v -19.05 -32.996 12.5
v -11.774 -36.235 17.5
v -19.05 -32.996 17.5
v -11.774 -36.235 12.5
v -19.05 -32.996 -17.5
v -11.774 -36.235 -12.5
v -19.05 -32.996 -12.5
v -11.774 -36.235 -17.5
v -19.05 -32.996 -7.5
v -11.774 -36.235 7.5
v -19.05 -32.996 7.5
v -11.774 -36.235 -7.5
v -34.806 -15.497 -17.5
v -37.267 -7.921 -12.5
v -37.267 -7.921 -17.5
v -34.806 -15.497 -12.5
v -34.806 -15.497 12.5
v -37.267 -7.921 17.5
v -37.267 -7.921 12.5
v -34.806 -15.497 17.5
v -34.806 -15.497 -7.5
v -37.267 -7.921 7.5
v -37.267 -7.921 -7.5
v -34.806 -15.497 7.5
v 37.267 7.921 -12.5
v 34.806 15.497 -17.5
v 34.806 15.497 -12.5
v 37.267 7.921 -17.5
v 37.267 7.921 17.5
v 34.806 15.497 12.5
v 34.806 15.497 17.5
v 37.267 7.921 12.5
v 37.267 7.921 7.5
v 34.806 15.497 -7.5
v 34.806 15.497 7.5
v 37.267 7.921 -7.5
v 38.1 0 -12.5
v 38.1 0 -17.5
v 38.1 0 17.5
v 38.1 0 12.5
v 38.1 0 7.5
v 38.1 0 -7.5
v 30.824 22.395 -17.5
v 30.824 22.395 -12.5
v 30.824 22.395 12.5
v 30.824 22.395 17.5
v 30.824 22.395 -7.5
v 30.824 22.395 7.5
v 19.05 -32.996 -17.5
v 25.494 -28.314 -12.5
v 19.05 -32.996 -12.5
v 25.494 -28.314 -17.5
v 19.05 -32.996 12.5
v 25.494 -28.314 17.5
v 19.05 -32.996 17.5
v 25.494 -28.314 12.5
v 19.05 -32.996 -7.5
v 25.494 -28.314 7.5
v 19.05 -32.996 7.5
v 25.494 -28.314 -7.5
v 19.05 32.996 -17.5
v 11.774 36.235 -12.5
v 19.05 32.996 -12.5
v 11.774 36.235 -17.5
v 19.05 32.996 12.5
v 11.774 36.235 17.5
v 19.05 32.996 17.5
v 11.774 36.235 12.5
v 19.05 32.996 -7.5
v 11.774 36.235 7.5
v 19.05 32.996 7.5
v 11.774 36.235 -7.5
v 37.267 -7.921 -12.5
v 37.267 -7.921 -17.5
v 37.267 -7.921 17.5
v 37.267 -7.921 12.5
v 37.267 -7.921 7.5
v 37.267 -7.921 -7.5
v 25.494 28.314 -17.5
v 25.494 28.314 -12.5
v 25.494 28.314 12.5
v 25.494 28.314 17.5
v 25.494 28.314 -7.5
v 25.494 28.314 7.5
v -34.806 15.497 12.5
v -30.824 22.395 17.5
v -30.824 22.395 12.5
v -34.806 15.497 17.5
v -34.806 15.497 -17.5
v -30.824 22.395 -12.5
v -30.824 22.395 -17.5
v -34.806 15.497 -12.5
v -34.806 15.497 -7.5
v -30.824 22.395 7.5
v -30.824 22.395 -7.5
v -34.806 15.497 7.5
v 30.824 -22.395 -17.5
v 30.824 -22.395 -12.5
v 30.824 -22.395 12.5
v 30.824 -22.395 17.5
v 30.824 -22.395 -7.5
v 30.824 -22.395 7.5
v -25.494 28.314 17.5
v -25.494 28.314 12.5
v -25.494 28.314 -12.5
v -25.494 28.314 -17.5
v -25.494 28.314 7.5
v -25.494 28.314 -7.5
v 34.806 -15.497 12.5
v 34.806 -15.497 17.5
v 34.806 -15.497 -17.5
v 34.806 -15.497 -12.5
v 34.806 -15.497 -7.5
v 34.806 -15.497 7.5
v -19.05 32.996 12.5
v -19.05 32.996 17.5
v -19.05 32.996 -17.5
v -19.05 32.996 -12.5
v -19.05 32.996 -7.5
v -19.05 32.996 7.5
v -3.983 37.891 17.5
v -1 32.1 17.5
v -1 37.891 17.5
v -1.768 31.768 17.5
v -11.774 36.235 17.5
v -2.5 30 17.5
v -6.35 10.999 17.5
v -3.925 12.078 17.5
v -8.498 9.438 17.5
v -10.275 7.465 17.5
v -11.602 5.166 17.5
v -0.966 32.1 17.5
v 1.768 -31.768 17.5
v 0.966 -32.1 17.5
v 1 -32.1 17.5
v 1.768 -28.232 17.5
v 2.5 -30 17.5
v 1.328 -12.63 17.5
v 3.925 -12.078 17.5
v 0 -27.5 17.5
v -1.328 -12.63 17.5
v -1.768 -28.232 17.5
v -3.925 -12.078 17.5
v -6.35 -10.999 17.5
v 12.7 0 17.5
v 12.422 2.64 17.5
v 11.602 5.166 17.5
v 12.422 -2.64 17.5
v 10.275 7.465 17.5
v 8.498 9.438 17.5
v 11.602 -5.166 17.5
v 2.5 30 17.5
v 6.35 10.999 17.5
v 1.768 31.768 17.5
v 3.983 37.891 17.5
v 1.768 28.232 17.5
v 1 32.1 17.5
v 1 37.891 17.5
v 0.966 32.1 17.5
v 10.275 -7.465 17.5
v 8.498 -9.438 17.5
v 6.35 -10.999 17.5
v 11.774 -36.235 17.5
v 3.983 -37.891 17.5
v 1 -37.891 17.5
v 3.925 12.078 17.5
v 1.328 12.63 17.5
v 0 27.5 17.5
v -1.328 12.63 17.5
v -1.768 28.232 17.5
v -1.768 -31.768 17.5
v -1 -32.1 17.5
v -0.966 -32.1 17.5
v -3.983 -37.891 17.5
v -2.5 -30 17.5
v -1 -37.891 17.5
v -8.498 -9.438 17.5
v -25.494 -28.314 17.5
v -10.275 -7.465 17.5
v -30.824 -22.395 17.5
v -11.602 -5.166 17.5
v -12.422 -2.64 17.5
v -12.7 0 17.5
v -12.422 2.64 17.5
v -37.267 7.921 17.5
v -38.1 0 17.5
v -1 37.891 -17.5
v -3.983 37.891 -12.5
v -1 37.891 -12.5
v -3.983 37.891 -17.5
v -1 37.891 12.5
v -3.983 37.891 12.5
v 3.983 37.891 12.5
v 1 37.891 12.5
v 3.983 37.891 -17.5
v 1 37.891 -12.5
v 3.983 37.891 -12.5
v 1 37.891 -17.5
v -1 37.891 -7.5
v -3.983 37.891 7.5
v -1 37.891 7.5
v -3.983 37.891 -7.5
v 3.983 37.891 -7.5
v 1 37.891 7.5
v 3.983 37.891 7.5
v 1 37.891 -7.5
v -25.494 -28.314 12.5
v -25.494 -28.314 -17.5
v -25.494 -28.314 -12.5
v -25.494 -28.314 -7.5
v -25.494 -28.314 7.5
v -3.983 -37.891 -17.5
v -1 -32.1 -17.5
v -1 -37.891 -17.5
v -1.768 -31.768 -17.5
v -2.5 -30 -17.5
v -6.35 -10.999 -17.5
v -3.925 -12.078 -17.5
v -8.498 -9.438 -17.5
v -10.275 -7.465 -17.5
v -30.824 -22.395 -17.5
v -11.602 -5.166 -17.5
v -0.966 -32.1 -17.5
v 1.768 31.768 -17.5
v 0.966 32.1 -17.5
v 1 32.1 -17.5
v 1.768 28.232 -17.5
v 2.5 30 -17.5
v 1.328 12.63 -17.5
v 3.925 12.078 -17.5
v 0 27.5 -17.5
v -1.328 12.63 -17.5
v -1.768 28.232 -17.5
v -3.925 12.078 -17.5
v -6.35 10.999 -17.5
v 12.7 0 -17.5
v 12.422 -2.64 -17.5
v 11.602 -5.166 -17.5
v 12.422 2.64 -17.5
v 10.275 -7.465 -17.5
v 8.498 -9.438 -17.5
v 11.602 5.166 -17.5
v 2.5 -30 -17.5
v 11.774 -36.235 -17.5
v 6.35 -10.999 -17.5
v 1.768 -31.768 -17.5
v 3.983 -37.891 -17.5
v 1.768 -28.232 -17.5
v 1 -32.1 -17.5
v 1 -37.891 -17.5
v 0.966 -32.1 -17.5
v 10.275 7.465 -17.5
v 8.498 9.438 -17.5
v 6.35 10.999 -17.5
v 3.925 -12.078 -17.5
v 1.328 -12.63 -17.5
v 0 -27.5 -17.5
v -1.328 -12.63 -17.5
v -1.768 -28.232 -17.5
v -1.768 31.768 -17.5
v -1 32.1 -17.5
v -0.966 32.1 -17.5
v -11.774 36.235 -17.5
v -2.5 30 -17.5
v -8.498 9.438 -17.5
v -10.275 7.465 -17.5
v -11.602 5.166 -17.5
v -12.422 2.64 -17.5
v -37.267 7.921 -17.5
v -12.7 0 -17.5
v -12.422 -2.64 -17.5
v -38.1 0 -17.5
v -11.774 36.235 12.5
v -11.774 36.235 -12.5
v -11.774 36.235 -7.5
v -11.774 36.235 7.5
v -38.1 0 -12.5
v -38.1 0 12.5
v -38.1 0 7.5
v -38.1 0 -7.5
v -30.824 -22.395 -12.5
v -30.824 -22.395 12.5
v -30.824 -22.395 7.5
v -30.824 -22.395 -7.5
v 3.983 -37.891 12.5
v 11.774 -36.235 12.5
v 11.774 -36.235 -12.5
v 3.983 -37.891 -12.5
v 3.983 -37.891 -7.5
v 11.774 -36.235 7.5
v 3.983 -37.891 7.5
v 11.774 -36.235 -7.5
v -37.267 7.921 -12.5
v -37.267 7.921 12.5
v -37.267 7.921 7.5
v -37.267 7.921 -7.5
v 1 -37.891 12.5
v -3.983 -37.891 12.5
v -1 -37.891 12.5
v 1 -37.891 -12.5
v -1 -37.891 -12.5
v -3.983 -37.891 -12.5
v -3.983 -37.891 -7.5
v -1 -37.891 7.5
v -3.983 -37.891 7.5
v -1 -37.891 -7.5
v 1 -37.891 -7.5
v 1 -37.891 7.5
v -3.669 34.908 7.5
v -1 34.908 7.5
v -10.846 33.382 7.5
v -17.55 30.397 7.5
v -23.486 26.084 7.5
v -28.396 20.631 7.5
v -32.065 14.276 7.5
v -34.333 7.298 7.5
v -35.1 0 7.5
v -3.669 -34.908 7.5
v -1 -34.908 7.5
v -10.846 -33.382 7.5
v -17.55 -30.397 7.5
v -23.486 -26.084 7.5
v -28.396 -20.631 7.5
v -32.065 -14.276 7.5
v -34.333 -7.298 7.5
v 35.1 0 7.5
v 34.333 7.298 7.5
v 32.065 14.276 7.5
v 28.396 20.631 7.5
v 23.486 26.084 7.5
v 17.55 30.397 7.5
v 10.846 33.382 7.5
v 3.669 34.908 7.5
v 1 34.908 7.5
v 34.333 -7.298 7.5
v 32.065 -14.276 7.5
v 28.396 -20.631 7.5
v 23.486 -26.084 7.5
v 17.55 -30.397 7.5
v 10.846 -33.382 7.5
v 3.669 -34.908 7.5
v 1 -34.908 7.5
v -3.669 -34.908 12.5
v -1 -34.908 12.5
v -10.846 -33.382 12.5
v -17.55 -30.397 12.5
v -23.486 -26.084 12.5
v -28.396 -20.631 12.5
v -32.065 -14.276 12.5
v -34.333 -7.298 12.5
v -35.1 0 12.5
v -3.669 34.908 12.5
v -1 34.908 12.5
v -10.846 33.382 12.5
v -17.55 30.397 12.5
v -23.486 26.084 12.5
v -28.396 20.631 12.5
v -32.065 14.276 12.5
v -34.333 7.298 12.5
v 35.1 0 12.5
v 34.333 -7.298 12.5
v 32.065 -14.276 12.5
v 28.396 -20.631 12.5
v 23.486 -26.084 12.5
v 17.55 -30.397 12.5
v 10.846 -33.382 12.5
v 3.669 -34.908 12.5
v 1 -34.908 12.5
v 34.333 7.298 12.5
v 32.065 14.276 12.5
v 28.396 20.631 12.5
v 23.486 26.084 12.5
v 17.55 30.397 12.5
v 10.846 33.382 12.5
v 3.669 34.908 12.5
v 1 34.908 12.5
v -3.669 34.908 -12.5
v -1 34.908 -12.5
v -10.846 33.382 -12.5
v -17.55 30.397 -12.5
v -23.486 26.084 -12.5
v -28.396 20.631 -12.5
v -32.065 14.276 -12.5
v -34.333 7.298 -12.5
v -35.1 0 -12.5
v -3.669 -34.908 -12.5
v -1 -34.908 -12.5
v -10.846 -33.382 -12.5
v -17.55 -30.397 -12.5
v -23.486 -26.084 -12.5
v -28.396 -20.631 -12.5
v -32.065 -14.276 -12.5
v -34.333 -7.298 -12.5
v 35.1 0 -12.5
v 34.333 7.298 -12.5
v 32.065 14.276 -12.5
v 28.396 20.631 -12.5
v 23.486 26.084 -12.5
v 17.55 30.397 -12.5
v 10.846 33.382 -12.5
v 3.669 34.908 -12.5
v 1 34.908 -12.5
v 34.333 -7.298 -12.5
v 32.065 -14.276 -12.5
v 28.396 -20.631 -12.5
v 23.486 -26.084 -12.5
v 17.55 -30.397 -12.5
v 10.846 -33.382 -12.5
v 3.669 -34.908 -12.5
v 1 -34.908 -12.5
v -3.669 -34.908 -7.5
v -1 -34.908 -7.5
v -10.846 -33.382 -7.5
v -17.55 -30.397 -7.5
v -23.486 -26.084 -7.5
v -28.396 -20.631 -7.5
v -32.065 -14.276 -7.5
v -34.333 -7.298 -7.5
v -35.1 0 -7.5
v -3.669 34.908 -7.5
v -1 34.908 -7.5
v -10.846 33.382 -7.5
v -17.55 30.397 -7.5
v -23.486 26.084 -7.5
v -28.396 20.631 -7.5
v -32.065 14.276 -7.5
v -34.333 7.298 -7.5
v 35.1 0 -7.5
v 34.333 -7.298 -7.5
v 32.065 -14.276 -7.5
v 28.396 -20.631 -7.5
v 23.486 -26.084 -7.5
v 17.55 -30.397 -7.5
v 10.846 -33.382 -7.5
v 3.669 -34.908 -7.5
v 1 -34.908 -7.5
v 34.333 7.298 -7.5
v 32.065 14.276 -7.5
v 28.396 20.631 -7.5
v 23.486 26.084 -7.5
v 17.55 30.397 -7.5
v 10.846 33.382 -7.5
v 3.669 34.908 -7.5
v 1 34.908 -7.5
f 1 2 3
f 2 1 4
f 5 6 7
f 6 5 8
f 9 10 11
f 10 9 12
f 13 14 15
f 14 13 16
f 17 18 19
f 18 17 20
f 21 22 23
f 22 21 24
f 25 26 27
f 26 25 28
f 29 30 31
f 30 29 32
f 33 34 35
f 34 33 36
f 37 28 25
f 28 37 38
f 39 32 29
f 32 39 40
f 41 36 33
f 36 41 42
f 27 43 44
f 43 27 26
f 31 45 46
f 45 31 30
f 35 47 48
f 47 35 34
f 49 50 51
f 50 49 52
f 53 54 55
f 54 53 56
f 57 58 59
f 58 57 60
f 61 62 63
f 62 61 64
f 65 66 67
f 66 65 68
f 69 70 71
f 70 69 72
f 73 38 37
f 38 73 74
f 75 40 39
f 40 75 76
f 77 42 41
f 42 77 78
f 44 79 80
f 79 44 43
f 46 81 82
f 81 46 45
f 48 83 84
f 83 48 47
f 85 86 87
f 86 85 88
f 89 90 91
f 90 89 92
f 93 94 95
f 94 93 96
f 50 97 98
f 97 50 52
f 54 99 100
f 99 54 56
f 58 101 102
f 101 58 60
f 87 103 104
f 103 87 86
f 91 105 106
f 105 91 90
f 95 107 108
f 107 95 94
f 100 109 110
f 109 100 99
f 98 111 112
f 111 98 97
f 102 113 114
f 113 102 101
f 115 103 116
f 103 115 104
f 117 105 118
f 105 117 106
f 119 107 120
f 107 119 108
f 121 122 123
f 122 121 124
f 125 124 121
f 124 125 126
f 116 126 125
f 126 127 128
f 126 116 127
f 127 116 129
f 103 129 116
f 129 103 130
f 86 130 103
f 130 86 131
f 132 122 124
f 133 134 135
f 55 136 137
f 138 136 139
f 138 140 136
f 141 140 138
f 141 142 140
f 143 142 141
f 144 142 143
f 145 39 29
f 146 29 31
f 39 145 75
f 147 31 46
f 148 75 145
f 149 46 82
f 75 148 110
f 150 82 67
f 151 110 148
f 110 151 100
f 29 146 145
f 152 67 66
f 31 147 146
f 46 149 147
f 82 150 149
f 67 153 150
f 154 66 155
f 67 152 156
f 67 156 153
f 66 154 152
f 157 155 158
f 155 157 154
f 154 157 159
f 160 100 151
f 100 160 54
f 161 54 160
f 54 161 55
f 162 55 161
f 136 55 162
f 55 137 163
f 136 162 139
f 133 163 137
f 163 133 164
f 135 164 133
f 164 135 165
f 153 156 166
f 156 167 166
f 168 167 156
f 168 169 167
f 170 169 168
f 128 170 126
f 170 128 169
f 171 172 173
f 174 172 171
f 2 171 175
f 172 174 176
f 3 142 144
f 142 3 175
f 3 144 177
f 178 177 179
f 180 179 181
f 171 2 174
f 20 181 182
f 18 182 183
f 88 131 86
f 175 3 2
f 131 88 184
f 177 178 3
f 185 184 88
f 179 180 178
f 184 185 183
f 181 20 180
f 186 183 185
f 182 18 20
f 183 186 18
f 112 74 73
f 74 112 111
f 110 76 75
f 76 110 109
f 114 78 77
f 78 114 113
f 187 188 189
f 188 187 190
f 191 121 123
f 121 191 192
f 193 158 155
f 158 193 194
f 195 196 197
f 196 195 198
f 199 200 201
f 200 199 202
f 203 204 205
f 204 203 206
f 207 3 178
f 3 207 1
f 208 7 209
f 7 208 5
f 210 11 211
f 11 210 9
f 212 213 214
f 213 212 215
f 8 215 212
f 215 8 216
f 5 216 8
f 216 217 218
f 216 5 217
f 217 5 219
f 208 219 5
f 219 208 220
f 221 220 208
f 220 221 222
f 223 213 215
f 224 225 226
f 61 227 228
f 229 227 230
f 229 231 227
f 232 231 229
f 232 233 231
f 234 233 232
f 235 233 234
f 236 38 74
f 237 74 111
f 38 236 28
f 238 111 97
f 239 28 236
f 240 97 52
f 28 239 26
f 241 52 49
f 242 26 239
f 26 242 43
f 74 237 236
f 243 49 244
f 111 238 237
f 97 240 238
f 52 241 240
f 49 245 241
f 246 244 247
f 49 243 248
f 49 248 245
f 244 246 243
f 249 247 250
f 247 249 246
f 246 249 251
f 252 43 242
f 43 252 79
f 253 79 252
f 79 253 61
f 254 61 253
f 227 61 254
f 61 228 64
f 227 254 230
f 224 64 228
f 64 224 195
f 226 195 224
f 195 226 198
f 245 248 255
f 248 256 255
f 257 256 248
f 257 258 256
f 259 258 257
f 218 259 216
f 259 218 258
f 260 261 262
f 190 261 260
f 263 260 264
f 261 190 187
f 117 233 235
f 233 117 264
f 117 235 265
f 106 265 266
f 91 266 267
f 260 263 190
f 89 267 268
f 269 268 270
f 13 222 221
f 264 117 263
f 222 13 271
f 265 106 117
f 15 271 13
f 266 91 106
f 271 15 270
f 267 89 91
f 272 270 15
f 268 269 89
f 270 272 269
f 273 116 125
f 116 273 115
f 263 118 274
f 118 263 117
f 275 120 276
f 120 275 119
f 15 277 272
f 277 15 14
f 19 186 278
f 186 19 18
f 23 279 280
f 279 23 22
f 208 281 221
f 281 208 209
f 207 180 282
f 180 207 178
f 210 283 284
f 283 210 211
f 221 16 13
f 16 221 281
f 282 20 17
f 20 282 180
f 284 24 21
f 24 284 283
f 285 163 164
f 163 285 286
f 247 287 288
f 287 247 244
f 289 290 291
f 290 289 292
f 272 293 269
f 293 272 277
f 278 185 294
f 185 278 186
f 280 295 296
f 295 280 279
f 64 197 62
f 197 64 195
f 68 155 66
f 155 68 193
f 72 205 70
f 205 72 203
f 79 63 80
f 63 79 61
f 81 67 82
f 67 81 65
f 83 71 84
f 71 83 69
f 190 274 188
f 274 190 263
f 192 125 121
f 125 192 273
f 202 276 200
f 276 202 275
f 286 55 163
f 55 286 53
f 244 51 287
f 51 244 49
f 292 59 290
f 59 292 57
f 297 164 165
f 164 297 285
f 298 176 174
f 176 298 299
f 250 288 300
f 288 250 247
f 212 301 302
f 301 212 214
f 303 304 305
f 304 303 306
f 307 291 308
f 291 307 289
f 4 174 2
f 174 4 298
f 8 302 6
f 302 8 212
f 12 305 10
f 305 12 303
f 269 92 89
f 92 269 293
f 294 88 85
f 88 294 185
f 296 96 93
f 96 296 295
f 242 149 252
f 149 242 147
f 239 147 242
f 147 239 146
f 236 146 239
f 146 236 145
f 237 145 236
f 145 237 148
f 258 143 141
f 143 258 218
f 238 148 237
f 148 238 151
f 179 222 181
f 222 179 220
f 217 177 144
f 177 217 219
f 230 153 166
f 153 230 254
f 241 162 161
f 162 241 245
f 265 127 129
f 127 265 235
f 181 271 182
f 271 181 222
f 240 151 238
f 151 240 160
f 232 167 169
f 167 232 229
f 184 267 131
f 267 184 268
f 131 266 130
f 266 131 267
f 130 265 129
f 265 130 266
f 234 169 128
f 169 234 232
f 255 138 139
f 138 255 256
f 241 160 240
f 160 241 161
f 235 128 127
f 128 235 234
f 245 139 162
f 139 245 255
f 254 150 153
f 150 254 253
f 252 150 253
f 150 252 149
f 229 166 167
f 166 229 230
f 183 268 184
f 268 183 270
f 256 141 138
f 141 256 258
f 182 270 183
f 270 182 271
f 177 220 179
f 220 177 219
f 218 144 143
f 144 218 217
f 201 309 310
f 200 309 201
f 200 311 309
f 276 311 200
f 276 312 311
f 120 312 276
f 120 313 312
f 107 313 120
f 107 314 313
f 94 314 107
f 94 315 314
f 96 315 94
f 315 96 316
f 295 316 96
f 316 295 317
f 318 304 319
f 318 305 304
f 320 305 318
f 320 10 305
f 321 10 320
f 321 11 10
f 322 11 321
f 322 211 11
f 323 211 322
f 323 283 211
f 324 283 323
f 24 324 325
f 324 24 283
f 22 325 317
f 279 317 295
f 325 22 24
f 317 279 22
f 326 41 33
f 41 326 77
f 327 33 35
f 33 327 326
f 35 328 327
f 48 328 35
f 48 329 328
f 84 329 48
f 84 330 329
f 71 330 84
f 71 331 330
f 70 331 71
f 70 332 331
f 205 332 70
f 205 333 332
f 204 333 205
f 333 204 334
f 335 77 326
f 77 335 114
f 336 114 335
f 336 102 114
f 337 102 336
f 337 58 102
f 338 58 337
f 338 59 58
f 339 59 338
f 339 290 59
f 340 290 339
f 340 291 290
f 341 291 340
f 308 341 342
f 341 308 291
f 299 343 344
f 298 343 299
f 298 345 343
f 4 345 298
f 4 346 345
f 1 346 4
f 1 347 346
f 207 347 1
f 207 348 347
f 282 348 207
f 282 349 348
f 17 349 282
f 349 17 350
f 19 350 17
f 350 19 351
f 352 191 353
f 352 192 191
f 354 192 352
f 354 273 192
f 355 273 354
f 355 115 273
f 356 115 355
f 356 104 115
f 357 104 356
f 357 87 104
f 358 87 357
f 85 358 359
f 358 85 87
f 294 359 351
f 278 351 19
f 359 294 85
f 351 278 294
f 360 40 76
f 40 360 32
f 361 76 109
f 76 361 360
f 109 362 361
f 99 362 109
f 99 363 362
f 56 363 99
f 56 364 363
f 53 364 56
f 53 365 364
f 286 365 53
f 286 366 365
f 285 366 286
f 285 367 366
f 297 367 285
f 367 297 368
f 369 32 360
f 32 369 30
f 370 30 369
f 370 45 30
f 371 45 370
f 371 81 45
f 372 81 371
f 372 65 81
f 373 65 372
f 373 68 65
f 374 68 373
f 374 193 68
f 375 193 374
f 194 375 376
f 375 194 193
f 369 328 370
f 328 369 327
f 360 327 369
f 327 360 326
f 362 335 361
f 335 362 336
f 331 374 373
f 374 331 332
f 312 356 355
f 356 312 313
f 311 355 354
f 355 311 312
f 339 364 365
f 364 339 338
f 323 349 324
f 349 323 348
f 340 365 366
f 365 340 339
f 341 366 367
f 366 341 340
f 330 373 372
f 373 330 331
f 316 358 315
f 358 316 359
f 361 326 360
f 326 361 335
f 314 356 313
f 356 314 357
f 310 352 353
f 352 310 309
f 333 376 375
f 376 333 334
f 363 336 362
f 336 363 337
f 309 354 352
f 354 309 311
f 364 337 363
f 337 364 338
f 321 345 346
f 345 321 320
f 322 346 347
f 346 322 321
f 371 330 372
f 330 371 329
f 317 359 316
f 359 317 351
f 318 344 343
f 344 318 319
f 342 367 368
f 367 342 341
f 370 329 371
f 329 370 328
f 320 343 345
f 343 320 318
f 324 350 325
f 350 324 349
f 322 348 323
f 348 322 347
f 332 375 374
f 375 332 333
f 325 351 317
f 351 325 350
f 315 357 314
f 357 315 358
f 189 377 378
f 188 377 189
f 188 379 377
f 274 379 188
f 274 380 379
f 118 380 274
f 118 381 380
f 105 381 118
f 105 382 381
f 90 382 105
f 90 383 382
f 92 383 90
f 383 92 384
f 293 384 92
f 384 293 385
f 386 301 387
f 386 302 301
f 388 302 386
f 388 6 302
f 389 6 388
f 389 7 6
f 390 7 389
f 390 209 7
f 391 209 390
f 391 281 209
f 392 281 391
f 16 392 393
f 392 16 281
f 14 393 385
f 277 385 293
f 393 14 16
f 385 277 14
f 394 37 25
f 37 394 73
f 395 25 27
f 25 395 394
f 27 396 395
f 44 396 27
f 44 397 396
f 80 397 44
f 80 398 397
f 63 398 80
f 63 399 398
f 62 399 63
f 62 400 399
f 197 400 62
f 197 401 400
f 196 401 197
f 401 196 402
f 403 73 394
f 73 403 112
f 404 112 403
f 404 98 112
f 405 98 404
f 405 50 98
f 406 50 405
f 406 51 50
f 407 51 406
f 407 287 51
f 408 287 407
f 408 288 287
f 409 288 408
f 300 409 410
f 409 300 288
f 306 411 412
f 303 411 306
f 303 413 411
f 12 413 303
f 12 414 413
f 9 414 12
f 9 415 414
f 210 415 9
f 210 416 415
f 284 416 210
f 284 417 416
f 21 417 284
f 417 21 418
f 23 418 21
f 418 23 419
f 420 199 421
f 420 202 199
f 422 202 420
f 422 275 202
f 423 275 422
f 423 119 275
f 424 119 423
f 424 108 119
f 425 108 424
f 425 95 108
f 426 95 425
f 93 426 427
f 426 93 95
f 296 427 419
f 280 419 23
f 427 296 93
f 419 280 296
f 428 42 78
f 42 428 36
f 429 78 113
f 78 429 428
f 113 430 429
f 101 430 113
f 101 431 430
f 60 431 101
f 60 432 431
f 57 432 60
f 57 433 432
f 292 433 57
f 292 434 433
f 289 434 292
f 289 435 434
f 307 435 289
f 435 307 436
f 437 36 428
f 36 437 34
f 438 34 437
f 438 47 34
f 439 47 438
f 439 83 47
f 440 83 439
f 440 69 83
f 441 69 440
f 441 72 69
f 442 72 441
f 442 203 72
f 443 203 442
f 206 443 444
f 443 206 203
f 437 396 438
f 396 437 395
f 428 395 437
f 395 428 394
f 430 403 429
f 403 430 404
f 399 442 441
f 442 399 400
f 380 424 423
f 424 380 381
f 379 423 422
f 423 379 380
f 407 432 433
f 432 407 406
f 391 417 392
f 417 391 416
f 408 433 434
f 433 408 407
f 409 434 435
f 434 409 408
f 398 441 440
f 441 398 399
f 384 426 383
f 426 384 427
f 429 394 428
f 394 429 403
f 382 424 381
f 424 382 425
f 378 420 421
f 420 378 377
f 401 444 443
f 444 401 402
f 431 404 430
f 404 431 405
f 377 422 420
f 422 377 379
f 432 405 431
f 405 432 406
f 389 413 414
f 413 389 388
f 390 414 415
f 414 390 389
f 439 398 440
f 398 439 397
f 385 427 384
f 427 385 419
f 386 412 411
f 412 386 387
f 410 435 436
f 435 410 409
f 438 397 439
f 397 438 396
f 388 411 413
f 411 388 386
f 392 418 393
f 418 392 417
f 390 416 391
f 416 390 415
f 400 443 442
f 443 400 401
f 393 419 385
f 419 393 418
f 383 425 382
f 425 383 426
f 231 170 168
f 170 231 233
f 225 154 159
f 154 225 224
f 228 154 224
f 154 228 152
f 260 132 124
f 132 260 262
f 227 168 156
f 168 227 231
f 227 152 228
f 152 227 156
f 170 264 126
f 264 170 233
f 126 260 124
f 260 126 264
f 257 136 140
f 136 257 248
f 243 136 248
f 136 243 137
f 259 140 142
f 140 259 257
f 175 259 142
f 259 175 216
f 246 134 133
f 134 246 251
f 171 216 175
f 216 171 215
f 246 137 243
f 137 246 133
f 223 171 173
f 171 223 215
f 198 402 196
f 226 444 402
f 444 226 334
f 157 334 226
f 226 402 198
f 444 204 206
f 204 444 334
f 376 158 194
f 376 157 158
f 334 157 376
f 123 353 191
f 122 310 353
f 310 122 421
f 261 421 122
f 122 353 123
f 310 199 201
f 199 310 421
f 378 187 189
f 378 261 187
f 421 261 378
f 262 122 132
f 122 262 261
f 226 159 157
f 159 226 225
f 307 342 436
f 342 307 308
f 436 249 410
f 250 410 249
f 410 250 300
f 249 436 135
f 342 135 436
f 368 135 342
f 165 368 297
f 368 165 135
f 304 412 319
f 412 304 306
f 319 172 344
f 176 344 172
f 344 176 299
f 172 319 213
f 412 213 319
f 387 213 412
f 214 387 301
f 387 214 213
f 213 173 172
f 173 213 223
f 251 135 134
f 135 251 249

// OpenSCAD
diametro_interior = 25.4;
diametro_exterior = 3 * 25.4;
diametro_cabeza_chicote = 5;
altura=35;
profundidad_ranura_long = 6;
profundidad_ranura_chic = 3;

radio_interior = diametro_interior / 2;
radio_exterior = diametro_exterior / 2;
radio_chicote  = diametro_cabeza_chicote / 2;


module arandela_ranura() {
    difference() {
        cylinder(h=5,   r=radio_exterior+0.2, center=true);
        cylinder(h=5+1, r=radio_exterior-profundidad_ranura_chic, center=true);
    }
}

module barra_hueca() {
    difference() {
        cylinder(h=altura,   r=radio_exterior, center=true);
        cylinder(h=altura+1, r=radio_interior, center=true);
    }
}


module polea_manubrio(){
    difference() {
        barra_hueca();
    
        /* Dos orificios para chicotes*/
        /*1:*/
        translate([0,30,0])
            cylinder(h=altura+2, r=radio_chicote, center=true);
        /*2:*/
        translate([0,-30,0])
            cylinder(h=altura+2, r=radio_chicote, center=true);        
    
    
        /* Dos ranuras longitudinales*/
        /*1:*/
        translate([0,+radio_exterior-profundidad_ranura_long/2,0])
            cube([2,profundidad_ranura_long,altura+1],center=true);        
        /*2:*/
        translate([0,-radio_exterior+profundidad_ranura_long/2,0])
            cube([2,profundidad_ranura_long,altura+1],center=true);        
    
    
        translate([0,0,10])
        arandela_ranura();
    
    
        translate([0,0,- 10])
        arandela_ranura();
    } 
}


angulo = 90*sin(360*$t);
rotate([0,0,angulo])
polea_manubrio();
